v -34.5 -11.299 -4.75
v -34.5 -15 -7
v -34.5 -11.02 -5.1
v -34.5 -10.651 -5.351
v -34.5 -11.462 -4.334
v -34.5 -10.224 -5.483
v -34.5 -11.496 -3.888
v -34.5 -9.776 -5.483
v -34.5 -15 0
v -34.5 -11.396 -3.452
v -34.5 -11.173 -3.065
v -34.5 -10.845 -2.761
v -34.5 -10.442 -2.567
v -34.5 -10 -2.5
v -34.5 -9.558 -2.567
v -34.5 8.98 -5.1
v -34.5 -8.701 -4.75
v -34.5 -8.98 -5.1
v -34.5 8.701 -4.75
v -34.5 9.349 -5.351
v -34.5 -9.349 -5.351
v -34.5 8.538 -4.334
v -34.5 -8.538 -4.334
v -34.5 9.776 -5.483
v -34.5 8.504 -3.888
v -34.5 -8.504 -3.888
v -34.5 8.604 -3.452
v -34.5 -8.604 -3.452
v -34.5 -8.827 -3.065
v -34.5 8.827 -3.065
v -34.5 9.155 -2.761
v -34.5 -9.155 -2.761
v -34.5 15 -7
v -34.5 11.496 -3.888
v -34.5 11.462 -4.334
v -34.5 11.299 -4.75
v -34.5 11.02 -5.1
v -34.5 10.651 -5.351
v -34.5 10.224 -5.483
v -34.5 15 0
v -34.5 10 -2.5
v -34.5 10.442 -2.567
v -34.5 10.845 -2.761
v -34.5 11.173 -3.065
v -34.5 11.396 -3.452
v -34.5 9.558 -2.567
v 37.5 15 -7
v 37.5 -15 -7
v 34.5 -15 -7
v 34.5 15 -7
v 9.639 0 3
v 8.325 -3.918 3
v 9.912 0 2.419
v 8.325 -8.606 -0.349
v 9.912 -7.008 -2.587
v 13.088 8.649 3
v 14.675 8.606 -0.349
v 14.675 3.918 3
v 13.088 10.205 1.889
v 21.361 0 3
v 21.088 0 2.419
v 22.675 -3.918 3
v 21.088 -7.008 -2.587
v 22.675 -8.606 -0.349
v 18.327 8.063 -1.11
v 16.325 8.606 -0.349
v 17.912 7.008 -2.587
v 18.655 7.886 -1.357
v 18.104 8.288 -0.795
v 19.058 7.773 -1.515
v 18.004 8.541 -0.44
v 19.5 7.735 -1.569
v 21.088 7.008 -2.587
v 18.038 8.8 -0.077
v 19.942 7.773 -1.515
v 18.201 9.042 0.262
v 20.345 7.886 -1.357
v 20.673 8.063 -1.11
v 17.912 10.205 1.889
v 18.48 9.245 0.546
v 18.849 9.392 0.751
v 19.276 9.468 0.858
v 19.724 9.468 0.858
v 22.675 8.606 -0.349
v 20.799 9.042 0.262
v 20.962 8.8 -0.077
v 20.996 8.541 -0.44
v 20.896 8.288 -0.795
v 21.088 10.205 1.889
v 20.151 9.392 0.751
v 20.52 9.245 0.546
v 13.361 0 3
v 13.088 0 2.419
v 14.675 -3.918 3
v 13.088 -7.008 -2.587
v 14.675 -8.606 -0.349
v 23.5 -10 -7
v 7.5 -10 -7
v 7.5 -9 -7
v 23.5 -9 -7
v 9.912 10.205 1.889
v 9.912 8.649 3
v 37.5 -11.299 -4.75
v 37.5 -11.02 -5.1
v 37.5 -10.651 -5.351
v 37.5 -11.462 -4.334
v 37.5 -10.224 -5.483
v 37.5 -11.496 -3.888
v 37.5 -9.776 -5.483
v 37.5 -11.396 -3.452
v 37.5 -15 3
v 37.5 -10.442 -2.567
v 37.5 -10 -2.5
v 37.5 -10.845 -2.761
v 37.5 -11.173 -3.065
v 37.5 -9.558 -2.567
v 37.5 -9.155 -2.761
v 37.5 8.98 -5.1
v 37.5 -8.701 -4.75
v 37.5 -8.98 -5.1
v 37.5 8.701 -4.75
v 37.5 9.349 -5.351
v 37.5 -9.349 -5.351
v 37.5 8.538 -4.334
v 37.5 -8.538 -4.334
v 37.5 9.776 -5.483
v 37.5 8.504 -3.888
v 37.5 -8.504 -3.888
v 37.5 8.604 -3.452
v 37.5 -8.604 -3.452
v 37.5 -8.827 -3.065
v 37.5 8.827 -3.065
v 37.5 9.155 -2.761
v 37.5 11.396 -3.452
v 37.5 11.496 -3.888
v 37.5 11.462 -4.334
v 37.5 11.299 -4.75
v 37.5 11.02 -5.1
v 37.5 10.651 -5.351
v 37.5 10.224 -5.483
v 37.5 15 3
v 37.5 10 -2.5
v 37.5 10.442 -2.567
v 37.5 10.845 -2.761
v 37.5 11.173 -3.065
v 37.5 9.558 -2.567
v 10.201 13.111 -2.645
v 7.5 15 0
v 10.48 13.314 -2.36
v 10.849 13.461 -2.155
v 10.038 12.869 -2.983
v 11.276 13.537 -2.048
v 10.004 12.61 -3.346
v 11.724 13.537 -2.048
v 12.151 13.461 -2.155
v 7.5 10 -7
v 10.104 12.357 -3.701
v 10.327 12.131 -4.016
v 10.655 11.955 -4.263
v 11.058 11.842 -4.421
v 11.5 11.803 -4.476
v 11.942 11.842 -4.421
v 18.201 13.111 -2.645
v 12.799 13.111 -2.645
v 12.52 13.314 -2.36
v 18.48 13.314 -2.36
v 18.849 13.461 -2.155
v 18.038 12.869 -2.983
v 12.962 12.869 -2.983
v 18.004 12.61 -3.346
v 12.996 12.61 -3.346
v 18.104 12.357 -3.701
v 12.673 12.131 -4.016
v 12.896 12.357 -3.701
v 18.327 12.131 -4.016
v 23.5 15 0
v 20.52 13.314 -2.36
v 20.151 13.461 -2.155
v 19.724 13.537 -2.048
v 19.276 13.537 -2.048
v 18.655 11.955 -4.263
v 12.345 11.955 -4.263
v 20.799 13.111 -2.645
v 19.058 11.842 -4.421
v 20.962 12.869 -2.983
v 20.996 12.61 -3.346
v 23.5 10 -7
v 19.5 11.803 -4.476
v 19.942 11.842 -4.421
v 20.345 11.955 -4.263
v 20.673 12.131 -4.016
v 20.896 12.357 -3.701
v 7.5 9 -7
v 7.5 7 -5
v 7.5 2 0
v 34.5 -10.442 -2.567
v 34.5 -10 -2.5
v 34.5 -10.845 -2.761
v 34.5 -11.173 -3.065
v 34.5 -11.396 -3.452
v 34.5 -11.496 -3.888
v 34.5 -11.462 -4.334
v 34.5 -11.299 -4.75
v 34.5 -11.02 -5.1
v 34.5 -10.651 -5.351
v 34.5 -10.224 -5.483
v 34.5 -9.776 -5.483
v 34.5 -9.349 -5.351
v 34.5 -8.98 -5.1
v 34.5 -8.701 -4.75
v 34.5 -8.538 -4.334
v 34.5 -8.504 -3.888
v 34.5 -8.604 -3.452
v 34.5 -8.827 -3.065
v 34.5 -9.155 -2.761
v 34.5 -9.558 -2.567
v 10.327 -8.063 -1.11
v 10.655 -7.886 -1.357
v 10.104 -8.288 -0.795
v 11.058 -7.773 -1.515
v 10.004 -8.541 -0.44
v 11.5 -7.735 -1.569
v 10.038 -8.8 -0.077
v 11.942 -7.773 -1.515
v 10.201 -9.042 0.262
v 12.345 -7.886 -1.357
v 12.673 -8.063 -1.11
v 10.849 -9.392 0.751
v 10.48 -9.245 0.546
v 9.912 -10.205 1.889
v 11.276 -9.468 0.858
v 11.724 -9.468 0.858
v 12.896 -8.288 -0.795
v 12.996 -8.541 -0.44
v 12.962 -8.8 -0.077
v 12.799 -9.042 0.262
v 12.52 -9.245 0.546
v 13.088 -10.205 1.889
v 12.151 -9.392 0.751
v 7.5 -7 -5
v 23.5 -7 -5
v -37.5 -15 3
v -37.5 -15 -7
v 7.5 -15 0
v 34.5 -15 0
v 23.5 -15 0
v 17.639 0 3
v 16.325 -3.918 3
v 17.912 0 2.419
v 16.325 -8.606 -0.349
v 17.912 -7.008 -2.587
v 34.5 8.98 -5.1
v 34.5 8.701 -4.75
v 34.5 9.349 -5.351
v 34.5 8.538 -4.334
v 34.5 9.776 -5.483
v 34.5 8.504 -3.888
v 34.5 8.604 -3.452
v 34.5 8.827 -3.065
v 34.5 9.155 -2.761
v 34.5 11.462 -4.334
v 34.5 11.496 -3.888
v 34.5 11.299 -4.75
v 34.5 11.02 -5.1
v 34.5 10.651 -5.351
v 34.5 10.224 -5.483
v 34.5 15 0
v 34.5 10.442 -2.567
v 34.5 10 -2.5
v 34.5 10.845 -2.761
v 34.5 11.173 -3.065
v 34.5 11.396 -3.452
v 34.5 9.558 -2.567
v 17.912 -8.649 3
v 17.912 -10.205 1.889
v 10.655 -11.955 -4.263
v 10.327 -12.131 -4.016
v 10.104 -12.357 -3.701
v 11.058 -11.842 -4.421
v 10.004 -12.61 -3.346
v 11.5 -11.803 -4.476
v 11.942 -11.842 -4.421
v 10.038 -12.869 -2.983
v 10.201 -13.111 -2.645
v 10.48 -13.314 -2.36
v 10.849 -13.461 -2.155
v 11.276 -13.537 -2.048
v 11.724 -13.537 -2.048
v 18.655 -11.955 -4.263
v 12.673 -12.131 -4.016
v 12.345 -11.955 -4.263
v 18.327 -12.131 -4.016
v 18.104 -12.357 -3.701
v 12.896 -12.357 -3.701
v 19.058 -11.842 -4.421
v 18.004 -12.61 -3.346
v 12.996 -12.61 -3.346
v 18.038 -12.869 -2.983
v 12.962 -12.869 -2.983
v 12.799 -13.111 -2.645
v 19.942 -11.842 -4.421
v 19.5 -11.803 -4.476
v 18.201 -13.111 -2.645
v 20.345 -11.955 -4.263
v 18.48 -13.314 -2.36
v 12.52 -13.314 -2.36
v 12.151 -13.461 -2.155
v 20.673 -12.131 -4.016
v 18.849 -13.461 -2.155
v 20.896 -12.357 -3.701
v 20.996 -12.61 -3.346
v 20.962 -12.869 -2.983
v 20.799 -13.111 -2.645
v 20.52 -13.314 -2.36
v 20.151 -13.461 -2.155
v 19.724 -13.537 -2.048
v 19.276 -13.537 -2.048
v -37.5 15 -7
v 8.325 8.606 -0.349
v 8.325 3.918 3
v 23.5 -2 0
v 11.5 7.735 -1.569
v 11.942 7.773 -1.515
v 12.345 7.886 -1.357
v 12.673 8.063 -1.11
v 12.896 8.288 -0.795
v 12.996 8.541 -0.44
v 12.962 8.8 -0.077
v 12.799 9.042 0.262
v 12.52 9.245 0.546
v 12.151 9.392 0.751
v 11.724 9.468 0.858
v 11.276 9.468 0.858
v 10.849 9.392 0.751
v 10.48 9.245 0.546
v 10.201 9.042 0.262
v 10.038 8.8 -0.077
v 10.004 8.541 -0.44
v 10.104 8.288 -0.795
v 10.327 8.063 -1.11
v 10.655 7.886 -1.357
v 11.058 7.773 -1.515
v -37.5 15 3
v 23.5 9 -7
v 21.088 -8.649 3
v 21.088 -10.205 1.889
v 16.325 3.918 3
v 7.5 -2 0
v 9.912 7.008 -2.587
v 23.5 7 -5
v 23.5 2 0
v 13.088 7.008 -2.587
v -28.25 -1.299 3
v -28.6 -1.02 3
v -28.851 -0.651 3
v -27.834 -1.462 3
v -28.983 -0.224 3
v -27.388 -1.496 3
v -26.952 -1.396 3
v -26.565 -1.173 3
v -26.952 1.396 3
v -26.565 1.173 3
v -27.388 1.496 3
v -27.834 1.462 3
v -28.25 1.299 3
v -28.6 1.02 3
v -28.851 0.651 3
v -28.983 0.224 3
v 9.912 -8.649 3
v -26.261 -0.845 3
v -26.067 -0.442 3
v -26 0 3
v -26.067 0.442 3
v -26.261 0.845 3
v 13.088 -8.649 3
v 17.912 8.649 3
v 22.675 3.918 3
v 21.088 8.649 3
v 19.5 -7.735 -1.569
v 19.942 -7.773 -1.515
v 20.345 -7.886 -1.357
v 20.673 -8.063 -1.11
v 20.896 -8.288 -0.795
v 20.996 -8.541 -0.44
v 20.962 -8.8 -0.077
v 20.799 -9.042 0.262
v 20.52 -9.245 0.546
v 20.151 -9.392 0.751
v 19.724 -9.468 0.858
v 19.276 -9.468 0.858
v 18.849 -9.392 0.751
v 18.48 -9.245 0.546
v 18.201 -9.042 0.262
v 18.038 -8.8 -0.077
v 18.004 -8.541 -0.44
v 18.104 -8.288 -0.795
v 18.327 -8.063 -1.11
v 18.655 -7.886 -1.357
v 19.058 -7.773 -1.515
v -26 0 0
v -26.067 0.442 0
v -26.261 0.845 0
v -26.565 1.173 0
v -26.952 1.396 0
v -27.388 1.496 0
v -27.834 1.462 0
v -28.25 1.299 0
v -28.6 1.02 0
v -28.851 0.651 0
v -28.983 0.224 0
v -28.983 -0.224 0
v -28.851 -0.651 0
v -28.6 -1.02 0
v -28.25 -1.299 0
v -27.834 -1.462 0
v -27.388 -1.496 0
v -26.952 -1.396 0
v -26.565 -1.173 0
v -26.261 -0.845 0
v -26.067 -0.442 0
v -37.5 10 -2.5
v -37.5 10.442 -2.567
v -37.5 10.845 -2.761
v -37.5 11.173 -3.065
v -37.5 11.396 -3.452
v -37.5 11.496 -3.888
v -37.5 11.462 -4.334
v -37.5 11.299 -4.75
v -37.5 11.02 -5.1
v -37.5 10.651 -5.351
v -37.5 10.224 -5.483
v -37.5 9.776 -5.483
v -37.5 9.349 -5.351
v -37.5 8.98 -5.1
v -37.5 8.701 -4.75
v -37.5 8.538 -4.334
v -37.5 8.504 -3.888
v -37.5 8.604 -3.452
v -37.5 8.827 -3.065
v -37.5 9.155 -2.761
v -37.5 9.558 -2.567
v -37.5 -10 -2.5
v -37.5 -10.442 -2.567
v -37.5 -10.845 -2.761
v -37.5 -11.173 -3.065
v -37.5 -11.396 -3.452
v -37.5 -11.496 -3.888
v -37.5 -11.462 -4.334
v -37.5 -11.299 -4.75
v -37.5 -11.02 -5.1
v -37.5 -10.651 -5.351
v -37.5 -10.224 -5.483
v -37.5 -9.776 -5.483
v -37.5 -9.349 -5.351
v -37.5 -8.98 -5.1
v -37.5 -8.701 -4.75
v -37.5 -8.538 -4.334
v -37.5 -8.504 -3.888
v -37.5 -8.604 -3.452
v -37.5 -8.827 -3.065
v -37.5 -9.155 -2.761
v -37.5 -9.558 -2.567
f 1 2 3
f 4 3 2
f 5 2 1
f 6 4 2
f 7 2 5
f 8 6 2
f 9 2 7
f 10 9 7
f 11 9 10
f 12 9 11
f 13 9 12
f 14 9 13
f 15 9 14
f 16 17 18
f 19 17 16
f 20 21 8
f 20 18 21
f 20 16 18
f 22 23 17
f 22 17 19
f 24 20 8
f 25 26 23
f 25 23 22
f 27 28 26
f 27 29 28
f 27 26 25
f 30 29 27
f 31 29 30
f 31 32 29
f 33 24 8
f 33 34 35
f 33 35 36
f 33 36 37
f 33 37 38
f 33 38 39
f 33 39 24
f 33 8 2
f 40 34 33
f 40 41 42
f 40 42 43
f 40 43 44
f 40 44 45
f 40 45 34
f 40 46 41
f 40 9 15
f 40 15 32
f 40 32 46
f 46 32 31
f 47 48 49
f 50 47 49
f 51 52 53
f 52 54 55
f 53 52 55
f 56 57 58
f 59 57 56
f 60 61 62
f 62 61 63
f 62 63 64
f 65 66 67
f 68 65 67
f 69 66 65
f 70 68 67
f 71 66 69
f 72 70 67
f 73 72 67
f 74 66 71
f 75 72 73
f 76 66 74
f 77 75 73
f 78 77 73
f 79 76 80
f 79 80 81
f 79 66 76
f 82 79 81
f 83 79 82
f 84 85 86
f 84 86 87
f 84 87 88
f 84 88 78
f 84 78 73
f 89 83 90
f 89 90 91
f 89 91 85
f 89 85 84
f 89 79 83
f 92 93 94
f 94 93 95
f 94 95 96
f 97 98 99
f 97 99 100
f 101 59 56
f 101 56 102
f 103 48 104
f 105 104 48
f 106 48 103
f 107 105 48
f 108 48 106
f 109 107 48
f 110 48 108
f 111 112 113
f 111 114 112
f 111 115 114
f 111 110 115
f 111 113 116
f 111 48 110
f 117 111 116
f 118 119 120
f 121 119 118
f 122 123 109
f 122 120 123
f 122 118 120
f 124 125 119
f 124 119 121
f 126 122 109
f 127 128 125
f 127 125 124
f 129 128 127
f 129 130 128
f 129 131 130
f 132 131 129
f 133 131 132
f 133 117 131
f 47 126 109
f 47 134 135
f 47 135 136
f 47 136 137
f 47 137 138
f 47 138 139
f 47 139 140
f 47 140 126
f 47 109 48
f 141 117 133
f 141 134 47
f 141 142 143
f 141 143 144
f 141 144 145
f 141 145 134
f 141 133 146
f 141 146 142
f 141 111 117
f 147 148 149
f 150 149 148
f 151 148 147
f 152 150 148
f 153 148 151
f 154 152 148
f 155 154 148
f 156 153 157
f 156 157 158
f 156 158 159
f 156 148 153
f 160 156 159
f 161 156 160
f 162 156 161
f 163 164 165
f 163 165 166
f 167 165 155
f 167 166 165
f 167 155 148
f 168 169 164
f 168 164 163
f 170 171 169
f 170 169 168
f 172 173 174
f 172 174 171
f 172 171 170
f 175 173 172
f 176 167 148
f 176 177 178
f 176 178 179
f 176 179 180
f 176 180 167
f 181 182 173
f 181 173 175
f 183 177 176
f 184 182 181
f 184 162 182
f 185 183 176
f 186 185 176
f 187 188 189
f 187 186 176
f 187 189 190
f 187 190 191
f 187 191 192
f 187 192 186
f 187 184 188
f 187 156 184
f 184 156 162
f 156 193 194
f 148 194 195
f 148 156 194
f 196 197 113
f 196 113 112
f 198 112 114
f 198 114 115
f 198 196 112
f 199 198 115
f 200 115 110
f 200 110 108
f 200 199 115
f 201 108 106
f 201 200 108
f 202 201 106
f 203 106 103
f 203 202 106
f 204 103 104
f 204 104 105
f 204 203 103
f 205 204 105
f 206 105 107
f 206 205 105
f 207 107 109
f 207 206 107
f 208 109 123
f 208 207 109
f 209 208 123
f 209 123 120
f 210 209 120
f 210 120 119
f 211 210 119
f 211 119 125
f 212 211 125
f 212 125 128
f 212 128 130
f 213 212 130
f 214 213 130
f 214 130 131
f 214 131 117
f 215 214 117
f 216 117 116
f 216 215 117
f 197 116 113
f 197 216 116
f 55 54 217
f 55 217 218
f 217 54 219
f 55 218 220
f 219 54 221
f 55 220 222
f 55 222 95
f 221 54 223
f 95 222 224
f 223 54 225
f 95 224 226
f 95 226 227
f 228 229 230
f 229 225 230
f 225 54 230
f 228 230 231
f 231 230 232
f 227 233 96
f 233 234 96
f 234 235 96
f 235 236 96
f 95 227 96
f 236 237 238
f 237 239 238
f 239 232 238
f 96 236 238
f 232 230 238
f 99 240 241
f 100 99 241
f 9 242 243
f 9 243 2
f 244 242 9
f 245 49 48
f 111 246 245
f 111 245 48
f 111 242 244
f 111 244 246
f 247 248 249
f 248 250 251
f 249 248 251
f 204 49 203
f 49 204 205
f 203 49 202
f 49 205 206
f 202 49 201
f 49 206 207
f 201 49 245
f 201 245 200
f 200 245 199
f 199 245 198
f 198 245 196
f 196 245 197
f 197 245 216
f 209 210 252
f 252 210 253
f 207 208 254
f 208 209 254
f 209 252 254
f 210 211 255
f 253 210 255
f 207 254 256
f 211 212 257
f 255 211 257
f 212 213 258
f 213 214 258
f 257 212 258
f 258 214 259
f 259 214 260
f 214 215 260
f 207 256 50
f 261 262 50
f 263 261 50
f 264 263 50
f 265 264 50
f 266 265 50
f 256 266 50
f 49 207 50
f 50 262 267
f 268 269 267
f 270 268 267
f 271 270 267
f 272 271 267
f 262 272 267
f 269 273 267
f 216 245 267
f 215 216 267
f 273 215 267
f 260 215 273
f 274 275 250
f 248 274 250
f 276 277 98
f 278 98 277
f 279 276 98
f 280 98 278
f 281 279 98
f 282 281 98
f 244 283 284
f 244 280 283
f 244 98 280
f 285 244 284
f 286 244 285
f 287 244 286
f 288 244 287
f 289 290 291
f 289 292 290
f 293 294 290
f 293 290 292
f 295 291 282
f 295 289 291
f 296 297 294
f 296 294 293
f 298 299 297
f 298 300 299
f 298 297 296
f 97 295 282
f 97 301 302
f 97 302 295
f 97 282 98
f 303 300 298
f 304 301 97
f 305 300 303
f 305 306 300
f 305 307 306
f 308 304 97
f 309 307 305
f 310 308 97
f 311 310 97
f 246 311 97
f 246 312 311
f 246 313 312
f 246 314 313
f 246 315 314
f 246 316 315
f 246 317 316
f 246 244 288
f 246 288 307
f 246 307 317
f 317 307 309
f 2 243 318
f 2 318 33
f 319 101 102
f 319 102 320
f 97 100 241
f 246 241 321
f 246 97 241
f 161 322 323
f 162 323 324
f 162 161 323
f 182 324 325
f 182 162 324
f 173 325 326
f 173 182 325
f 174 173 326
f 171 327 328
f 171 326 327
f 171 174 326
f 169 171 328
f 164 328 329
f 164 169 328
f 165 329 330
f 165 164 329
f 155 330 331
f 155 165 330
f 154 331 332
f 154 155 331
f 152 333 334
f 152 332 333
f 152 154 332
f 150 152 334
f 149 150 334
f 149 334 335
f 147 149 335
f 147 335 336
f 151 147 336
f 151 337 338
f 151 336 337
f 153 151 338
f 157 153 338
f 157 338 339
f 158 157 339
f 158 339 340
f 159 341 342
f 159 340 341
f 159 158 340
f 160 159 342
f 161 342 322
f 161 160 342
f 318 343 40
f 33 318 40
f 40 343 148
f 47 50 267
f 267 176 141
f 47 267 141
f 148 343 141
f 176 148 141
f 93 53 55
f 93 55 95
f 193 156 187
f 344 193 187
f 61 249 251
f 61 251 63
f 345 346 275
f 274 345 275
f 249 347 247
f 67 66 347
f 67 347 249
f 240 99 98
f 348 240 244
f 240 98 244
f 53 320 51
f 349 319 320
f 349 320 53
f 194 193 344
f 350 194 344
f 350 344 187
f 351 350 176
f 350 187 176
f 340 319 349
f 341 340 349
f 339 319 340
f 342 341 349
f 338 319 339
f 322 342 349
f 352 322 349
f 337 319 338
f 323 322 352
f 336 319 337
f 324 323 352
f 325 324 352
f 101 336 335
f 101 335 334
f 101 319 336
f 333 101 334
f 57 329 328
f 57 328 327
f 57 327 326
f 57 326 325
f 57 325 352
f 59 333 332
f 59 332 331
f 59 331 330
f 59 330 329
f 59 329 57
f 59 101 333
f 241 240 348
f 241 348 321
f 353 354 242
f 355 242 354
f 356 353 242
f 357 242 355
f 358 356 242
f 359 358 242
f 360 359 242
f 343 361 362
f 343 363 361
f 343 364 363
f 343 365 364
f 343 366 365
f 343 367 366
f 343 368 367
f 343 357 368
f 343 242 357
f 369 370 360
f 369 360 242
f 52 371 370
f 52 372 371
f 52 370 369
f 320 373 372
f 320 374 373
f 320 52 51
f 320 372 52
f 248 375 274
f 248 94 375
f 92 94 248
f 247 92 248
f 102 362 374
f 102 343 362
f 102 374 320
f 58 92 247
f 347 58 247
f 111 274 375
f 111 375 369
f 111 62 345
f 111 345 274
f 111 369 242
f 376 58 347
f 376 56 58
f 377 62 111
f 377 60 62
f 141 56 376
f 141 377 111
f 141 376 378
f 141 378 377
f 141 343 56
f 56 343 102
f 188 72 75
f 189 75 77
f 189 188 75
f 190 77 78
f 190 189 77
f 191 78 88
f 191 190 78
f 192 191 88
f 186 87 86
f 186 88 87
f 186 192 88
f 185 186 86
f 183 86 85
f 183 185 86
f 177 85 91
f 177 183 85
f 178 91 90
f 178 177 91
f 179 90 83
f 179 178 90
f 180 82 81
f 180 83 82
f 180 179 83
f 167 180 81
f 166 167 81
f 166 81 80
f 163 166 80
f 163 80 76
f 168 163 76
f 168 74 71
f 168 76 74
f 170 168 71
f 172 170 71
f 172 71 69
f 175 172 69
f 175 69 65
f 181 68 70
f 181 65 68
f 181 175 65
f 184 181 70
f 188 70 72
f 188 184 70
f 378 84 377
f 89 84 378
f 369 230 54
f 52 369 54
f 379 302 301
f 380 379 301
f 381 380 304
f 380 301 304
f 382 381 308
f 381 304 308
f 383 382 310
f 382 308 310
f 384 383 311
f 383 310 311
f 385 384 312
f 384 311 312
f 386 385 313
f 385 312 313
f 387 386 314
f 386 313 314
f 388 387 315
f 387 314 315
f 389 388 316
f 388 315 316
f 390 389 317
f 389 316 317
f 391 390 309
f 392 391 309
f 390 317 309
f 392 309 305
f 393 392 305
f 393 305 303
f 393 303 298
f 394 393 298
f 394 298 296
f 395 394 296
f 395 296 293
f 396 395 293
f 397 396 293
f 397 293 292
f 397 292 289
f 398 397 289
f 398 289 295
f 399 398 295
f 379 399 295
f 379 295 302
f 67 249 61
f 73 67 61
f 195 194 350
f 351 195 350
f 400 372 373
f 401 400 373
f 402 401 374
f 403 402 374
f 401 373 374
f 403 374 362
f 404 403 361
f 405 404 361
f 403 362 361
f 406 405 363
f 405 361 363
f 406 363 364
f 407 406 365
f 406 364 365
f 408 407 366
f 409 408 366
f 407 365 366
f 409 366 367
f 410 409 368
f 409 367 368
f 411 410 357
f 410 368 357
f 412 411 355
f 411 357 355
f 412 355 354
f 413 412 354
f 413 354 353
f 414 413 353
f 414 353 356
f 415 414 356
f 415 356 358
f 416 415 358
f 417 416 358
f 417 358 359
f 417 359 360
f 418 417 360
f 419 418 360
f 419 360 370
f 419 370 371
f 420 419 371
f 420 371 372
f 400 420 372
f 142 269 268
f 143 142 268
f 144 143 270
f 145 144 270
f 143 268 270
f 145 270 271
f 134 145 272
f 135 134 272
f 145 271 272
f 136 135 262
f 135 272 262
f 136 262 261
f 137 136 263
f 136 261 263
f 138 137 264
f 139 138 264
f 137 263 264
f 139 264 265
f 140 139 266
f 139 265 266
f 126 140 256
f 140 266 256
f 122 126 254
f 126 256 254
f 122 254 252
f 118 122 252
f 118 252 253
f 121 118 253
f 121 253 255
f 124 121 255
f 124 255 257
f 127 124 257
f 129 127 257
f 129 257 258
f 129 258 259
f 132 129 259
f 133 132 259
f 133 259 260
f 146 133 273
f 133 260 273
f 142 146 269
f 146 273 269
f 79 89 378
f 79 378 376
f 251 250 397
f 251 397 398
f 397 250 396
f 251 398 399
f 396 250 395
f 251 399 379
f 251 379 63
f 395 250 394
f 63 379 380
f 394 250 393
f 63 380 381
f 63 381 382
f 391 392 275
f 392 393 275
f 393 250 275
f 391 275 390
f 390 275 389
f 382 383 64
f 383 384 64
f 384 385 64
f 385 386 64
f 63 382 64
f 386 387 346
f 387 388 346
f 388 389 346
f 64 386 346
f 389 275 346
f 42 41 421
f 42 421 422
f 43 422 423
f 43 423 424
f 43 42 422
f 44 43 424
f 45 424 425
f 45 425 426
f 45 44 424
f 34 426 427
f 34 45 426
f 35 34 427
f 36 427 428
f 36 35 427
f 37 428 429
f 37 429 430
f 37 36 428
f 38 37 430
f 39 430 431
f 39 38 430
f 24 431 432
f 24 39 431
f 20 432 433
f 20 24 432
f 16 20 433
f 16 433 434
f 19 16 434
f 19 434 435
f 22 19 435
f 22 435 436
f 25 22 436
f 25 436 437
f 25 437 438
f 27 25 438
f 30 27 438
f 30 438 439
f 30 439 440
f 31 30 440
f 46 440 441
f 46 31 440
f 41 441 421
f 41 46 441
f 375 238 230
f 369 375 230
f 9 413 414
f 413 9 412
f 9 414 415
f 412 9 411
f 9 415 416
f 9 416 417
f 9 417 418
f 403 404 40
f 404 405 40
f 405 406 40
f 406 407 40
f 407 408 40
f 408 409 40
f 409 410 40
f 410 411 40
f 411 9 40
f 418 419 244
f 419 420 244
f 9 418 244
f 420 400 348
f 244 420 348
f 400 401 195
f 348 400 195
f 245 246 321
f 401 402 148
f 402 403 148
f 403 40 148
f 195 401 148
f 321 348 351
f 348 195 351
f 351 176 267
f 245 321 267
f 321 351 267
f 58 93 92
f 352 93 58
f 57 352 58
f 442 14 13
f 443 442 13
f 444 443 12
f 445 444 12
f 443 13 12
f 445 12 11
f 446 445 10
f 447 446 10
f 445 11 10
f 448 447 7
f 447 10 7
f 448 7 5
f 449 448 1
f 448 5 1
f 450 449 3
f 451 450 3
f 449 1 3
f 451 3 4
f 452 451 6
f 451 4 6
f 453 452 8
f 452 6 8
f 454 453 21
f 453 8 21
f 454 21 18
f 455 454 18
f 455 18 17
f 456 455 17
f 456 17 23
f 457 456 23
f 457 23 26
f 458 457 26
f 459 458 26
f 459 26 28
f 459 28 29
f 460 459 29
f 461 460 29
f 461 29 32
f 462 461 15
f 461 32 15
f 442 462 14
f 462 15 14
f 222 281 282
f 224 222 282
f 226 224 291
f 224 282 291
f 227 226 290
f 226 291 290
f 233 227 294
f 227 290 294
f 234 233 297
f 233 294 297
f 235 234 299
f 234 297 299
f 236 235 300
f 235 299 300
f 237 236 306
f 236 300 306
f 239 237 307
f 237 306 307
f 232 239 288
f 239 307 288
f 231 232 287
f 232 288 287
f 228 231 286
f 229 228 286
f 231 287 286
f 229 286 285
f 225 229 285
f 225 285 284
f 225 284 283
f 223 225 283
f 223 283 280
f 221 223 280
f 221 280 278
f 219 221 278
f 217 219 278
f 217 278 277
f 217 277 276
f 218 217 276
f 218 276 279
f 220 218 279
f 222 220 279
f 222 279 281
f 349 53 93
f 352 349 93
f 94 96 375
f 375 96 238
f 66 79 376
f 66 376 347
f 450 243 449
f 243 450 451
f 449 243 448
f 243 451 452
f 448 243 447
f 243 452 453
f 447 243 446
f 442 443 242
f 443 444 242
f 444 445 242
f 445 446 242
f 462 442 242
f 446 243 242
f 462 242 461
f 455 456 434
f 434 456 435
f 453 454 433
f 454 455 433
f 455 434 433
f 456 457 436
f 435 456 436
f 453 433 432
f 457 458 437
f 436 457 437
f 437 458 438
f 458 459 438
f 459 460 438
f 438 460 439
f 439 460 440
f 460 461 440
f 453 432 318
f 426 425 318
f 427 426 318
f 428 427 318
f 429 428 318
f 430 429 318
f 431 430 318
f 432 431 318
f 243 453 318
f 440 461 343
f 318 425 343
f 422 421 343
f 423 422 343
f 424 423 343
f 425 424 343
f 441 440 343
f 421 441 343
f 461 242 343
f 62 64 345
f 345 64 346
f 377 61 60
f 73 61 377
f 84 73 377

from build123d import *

# Parameters (mm, degrees)
SKETCH1_W               = 75
SKETCH1_H               = 30
BOSS_EXTRUDE1_DEPTH     = 3
SKETCH2_W               = 3
SKETCH2_H               = 30
BOSS_EXTRUDE2_DEPTH     = 7
SKETCH4_R               = 1.5
CUT_EXTRUDE1_DEPTH      = 3
MIRROR1_COPY_1_SKETCH_R = 1.5
MIRROR1_COPY_1_DEPTH    = 3
SKETCH5_W               = 16
SKETCH5_H               = 7
BOSS_EXTRUDE3_DEPTH     = 8
CHAMFER1_SIZE           = 5
CHAMFER1_SIZE2          = 7
CHAMFER2_SIZE           = 5
CHAMFER3_SIZE           = 2
SKETCH6_R               = 1.5
CUT_EXTRUDE2_DEPTH      = 8
CUT_EXTRUDE3_START      = -5
CUT_EXTRUDE3_DEPTH      = 42.149507332
CHAMFER4_SIZE           = 7
CHAMFER4_SIZE2          = 5
CHAMFER5_SIZE           = 5
CHAMFER6_SIZE           = 2
SKETCH8_R               = 1.5
CUT_EXTRUDE4_DEPTH      = 42.608292443


with BuildPart() as part:
    # Sketch1 → Boss-Extrude1 (new body)
    with BuildSketch(Plane.XY):
        Rectangle(SKETCH1_W, SKETCH1_H)
    extrude(amount=BOSS_EXTRUDE1_DEPTH)

    # Sketch2 → Boss-Extrude2 (add)
    with BuildSketch(Plane(origin=(0, 0, 0), x_dir=(-1, 0, 0), z_dir=(0, 0, -1))):
        with Locations((-36, 0)):
            Rectangle(SKETCH2_W, SKETCH2_H)
    boss_extrude2 = extrude(amount=BOSS_EXTRUDE2_DEPTH)

    # Sketch4 → Cut-Extrude1 (cut)
    with BuildSketch(Plane.ZY.offset(-34.5)):
        with Locations((-4, 10)):
            Circle(SKETCH4_R)
    cut_extrude1 = extrude(amount=-CUT_EXTRUDE1_DEPTH, mode=Mode.SUBTRACT)

    # Mirror2: Cut-Extrude1 across plane
    add(cut_extrude1.mirror(Plane.ZX), mode=Mode.SUBTRACT)

    # Mirror1: Boss-Extrude2, Cut-Extrude1 across plane
    add(boss_extrude2.mirror(Plane(origin=(0, 0, 0), x_dir=(0, 0, 1), z_dir=(1, 0, 0))))
    add(cut_extrude1.mirror(Plane(origin=(0, 0, 0), x_dir=(0, 0, 1), z_dir=(1, 0, 0))), mode=Mode.SUBTRACT)

    # Mirror1 copy 1 sketch → Mirror1 copy 1 (cut)
    with BuildSketch(Plane(origin=(-34.5, 0, 0), x_dir=(0, 0, 1), z_dir=(1, 0, 0))):
        with Locations((-4, 10)):
            Circle(MIRROR1_COPY_1_SKETCH_R)
    extrude(amount=-MIRROR1_COPY_1_DEPTH, mode=Mode.SUBTRACT)

    # Sketch5 → Boss-Extrude3 (add)
    with BuildSketch(Plane.XZ.offset(15)):
        with Locations((15.5, -3.5)):
            Rectangle(SKETCH5_W, SKETCH5_H)
    boss_extrude3 = extrude(amount=-BOSS_EXTRUDE3_DEPTH)

    # Chamfer1
    chamfer1_edges = [part.edges().sort_by_distance(p)[0] for p in [
        (15.5, -15, -7),
    ]]
    chamfer1_side = [part.faces().sort_by_distance(p)[0] for p in [
        (15.5, -11, -7),
    ]]
    chamfer(chamfer1_edges, length=CHAMFER1_SIZE, length2=CHAMFER1_SIZE2, reference=chamfer1_side[0])

    # Chamfer2
    chamfer2_edges = [part.edges().sort_by_distance(p)[0] for p in [
        (15.5, -7, 0),
    ]]
    chamfer(chamfer2_edges, length=CHAMFER2_SIZE)

    # Chamfer3
    chamfer3_edges = [part.edges().sort_by_distance(p)[0] for p in [
        (15.5, -7, -7),
    ]]
    chamfer(chamfer3_edges, length=CHAMFER3_SIZE - 0.0001)  # a hair under: the kernel refuses the full size

    # Sketch6 → Cut-Extrude2 (cut)
    with BuildSketch(Plane(origin=(0, -9.932432432, -7.094594595), x_dir=(1, 0, 0), z_dir=(0, -0.8137334712067358, -0.5812381937190955))):
        with Locations(Location((11.5, 4.718572906, 0), (0, 0, 270))):
            Circle(SKETCH6_R)
        with Locations(Location((19.5, 4.718572906, 0), (0, 0, 270))):
            Circle(SKETCH6_R)
    cut_extrude2 = extrude(amount=-CUT_EXTRUDE2_DEPTH, mode=Mode.SUBTRACT)

    # Sketch7 → Cut-Extrude3 (cut, through all)
    with BuildSketch(Plane(origin=(0, -9.932432432, -7.094594595), x_dir=(1, 0, 0), z_dir=(0, -0.8137334712067358, -0.5812381937190955)).offset(CUT_EXTRUDE3_START)):
        Polygon((8.324573519, 4.718572906), (9.91228676, 1.968572906), (13.08771324, 1.968572906), (14.675426481, 4.718572906), (13.08771324, 7.468572906), (9.91228676, 7.468572906), align=None)
        Polygon((16.324573519, 4.718572906), (17.91228676, 1.968572906), (21.08771324, 1.968572906), (22.675426481, 4.718572906), (21.08771324, 7.468572906), (17.91228676, 7.468572906), align=None)
    cut_extrude3 = extrude(amount=-CUT_EXTRUDE3_DEPTH, mode=Mode.SUBTRACT)

    # Mirror3: Boss-Extrude3 across plane
    add(boss_extrude3.mirror(Plane.ZX))

    # Chamfer4
    chamfer4_edges = [part.edges().sort_by_distance(p)[0] for p in [
        (15.5, 15, -7),
    ]]
    chamfer4_side = [part.faces().sort_by_distance(p)[0] for p in [
        (0, 15, 2.243362702),
    ]]
    chamfer(chamfer4_edges, length=CHAMFER4_SIZE, length2=CHAMFER4_SIZE2, reference=chamfer4_side[0])

    # Chamfer5
    chamfer5_edges = [part.edges().sort_by_distance(p)[0] for p in [
        (15.5, 7, 0),
    ]]
    chamfer(chamfer5_edges, length=CHAMFER5_SIZE)

    # Chamfer6
    chamfer6_edges = [part.edges().sort_by_distance(p)[0] for p in [
        (15.5, 7, -7),
    ]]
    chamfer(chamfer6_edges, length=CHAMFER6_SIZE - 0.0001)  # a hair under: the kernel refuses the full size

    # Mirror4: Cut-Extrude2, Cut-Extrude3 across plane
    add(cut_extrude2.mirror(Plane.ZX), mode=Mode.SUBTRACT)
    add(cut_extrude3.mirror(Plane.ZX), mode=Mode.SUBTRACT)

    # Sketch8 → Cut-Extrude4 (cut, through all)
    with BuildSketch(Plane.XY.offset(3)):
        with Locations((-27.5, 0)):
            Circle(SKETCH8_R)
    extrude(amount=-CUT_EXTRUDE4_DEPTH, mode=Mode.SUBTRACT)


solid = part.part
